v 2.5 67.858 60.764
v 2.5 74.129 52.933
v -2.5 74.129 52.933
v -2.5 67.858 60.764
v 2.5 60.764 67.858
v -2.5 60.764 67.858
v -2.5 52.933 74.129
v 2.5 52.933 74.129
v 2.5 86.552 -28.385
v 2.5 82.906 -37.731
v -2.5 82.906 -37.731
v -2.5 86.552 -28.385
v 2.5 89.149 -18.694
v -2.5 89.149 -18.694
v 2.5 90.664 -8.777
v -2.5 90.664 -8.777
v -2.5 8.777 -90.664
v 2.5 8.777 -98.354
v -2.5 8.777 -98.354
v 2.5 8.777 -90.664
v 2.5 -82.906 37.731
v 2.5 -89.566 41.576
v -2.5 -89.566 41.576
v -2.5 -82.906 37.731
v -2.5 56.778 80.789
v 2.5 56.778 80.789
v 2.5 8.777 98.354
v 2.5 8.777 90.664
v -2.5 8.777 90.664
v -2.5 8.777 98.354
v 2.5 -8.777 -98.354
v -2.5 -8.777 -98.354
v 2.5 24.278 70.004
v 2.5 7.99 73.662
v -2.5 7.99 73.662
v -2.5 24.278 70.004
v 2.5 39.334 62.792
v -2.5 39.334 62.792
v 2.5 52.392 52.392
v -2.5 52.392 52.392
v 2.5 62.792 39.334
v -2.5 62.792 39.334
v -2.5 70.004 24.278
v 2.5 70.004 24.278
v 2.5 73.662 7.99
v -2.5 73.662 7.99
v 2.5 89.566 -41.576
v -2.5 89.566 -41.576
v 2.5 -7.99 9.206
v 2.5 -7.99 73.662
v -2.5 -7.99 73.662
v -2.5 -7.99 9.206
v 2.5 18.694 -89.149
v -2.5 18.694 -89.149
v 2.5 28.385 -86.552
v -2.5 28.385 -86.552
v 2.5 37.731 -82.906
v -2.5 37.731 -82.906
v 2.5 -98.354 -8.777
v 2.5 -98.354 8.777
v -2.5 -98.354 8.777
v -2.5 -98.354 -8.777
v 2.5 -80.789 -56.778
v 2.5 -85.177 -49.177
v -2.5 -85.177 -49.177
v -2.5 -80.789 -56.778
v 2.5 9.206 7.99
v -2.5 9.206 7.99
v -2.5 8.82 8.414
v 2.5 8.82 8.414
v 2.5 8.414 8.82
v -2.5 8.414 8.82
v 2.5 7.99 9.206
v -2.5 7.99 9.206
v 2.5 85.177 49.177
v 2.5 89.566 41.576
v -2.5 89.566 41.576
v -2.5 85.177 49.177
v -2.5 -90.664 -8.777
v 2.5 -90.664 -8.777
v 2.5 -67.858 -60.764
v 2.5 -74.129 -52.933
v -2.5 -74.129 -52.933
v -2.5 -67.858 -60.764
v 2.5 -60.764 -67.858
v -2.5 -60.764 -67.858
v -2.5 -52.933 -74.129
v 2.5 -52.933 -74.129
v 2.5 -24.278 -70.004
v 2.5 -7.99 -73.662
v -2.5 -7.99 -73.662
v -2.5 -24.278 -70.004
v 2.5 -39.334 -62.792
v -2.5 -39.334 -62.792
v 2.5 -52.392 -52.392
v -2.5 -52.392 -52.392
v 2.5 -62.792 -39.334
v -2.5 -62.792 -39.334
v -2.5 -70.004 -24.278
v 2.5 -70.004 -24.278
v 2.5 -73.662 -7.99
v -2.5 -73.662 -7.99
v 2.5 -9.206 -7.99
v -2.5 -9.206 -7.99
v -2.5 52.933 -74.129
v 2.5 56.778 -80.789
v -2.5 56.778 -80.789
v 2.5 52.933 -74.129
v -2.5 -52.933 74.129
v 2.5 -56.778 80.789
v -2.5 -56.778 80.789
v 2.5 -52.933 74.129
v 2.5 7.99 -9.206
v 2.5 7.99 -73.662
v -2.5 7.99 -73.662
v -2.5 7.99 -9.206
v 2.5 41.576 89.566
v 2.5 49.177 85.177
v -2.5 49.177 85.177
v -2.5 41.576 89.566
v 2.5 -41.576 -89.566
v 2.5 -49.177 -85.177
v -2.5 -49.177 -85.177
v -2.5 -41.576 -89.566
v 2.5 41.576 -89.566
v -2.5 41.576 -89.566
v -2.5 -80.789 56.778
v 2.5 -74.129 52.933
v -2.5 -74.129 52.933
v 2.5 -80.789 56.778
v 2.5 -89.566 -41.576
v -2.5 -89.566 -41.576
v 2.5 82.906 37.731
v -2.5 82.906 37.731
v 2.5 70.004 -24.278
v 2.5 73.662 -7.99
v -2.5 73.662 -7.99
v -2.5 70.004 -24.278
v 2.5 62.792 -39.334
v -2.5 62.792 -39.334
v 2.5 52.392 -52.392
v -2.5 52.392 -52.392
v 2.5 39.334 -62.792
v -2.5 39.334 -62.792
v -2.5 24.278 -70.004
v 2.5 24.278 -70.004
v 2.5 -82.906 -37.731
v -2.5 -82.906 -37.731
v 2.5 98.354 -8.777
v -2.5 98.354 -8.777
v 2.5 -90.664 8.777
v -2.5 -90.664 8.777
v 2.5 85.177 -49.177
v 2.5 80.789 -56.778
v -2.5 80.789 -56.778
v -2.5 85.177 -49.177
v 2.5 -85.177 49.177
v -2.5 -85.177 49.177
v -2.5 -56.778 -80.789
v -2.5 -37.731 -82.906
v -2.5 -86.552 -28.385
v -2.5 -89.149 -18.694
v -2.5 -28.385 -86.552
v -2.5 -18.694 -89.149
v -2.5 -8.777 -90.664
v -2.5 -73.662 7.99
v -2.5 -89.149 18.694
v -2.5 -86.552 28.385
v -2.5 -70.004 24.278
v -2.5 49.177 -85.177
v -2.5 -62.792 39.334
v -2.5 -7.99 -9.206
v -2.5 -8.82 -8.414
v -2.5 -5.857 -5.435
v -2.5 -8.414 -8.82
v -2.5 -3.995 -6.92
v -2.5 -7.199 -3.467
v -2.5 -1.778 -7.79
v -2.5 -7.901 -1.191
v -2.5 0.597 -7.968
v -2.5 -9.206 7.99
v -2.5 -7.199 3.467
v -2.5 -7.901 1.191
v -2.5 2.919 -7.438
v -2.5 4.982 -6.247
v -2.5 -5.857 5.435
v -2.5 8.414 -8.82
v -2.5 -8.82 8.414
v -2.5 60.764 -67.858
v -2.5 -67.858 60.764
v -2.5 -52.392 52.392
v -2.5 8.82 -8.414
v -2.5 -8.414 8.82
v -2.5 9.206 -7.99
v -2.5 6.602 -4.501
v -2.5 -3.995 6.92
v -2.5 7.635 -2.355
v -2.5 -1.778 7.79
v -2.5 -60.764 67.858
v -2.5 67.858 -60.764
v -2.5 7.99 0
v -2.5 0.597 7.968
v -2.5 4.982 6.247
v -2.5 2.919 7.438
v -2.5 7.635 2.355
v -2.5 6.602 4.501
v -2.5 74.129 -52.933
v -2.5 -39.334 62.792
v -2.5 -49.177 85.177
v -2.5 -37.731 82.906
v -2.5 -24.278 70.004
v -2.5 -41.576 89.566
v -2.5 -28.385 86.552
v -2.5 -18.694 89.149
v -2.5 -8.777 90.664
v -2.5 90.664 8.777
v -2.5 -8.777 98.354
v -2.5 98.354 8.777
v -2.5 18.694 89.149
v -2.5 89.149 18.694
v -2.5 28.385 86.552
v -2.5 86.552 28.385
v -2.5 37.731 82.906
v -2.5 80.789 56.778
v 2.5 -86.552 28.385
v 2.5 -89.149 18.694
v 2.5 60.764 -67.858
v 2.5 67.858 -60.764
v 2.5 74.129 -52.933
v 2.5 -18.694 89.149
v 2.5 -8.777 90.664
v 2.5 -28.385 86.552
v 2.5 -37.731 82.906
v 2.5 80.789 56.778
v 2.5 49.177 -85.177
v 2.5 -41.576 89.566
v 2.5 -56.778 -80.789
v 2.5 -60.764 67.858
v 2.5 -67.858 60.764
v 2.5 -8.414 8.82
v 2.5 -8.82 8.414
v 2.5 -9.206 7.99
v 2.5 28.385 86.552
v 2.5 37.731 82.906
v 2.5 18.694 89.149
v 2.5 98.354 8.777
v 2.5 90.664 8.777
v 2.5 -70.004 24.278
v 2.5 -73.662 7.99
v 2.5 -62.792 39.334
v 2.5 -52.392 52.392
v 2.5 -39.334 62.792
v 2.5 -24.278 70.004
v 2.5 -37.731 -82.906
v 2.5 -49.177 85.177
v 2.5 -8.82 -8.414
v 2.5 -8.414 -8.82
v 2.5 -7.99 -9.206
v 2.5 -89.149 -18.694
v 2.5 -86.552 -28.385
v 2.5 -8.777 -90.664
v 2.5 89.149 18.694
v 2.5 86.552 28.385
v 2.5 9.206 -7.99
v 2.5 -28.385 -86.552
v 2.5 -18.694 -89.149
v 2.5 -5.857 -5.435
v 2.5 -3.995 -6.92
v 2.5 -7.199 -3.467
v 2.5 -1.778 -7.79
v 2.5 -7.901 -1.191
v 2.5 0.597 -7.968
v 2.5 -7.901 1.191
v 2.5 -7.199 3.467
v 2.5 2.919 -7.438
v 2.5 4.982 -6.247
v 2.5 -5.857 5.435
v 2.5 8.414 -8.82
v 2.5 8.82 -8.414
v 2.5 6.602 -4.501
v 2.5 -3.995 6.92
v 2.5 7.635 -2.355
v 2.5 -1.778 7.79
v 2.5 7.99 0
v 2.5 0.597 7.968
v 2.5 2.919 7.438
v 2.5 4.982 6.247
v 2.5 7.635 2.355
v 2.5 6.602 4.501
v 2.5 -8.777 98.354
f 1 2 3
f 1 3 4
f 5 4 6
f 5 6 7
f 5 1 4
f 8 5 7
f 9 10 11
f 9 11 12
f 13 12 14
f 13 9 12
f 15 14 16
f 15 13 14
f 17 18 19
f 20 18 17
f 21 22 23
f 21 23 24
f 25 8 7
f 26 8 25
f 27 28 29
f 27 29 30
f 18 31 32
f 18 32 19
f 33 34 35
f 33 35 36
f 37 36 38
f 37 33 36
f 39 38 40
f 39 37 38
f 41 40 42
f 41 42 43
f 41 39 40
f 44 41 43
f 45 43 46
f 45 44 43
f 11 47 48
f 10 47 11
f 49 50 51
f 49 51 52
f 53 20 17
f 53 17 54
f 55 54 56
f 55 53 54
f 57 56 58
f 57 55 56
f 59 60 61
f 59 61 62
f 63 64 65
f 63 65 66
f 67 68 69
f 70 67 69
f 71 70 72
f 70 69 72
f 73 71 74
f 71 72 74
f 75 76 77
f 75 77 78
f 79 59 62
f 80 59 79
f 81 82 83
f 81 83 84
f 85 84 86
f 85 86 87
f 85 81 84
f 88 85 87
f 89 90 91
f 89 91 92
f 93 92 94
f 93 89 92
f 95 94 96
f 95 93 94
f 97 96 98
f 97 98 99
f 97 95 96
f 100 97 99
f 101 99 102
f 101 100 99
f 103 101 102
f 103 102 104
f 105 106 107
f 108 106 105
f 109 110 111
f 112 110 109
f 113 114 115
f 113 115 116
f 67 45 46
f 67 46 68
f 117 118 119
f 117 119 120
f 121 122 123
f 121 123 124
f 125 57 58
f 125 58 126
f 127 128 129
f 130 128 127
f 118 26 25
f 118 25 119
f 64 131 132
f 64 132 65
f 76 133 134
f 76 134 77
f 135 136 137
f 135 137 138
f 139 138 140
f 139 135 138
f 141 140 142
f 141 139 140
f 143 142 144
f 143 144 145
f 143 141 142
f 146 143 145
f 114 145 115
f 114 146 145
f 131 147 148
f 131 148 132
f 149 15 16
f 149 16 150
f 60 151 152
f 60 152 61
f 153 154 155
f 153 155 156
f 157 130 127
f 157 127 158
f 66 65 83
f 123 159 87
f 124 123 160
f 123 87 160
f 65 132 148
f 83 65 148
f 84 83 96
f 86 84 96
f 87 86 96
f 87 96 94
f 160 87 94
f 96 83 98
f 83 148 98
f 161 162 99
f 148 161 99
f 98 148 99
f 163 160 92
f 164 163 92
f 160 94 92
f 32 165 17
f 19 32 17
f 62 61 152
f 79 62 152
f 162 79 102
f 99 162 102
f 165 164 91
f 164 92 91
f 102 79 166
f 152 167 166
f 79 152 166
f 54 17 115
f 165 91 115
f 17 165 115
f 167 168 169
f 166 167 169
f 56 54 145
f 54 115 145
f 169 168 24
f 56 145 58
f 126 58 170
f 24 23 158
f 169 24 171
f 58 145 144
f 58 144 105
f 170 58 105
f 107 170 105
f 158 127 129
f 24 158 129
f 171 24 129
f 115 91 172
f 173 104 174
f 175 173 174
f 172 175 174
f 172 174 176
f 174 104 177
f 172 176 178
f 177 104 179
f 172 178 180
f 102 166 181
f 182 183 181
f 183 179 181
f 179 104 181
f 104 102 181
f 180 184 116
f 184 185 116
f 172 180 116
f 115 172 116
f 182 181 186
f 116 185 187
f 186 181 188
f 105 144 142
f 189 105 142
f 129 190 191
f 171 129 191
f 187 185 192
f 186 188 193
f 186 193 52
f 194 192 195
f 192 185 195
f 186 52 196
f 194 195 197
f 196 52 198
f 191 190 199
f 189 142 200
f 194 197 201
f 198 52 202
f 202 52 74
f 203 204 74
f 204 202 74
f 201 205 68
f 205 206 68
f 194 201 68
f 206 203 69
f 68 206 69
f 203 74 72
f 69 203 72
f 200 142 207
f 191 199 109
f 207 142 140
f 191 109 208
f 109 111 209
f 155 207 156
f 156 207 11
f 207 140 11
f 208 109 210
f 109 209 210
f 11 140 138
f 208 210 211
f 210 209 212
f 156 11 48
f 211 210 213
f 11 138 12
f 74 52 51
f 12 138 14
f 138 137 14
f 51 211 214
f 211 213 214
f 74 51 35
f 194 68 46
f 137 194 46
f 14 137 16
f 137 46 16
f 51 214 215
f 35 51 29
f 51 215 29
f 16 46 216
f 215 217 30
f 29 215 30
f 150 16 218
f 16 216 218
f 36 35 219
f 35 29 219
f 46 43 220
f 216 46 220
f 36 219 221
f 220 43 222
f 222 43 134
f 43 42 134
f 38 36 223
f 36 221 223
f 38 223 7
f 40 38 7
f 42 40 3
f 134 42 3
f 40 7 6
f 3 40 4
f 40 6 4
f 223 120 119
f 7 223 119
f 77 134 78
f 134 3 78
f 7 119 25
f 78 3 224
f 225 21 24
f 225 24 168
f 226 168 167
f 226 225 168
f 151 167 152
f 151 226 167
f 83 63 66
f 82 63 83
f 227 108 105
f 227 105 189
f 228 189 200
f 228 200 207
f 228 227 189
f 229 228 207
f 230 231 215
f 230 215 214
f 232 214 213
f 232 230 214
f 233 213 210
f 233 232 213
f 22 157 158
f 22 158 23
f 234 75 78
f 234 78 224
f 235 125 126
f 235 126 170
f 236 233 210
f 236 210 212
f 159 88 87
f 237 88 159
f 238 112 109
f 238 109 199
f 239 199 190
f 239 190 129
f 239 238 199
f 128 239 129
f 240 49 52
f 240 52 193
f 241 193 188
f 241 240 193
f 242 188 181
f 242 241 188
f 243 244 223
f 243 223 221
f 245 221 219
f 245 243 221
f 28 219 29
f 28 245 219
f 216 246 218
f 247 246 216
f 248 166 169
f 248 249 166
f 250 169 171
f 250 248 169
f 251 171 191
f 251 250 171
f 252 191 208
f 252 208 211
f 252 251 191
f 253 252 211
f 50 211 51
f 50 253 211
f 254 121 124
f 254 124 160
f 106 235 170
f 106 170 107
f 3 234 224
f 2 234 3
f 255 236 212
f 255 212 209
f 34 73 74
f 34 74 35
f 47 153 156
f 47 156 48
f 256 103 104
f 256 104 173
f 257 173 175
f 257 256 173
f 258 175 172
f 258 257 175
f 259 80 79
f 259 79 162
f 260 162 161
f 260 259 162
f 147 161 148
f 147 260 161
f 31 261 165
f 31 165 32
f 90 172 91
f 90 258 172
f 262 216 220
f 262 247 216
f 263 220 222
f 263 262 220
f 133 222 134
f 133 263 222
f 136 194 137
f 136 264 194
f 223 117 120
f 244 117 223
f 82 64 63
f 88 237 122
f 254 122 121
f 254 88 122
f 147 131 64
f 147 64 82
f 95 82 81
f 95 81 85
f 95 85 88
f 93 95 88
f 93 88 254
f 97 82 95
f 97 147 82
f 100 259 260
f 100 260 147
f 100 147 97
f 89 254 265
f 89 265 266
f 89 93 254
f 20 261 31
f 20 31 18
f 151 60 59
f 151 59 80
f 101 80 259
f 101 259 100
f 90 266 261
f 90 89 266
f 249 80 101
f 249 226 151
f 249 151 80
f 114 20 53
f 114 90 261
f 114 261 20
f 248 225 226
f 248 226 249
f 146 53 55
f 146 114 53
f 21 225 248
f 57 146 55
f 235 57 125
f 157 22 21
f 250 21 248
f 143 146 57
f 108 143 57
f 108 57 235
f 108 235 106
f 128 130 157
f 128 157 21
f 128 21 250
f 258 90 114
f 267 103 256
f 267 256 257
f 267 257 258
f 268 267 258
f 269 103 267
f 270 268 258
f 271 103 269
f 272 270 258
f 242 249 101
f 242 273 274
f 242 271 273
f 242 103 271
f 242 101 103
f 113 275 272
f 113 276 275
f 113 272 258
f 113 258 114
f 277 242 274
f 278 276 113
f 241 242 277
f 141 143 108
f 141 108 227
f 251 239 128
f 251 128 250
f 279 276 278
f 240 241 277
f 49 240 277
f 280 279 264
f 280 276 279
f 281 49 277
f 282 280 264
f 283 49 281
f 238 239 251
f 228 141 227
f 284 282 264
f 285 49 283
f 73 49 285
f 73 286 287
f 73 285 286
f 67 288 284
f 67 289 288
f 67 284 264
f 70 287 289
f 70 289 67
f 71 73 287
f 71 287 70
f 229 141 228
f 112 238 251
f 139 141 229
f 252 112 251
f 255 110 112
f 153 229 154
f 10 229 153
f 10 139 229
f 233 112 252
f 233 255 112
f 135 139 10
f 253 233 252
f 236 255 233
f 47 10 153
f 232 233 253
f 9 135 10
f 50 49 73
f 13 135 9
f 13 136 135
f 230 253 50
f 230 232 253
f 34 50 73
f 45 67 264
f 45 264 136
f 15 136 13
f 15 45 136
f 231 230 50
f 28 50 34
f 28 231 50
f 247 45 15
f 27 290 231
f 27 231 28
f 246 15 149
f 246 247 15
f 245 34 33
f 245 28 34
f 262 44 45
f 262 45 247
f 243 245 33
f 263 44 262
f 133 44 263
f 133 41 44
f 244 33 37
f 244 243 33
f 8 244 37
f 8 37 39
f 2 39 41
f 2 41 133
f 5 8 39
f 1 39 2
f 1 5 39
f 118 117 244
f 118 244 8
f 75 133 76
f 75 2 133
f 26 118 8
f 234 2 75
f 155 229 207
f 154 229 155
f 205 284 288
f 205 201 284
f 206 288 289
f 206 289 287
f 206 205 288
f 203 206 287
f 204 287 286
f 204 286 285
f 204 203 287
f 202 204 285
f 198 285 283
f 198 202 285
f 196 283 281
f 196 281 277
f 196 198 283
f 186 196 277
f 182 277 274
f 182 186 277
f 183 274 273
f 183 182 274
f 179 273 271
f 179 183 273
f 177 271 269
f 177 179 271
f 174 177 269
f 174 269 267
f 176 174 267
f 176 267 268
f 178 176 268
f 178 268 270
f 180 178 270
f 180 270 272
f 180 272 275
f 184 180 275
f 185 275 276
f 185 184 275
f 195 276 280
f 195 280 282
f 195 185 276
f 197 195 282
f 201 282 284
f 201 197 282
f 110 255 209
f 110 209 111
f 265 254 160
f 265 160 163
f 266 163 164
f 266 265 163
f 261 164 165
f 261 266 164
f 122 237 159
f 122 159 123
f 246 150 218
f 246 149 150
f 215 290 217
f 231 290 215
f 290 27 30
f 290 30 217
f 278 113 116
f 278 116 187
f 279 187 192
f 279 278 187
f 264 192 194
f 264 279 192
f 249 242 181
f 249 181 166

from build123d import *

# Parameters (mm, degrees)
F0_R     = 7.9900958087
F1_DEPTH = 2.5


with BuildPart() as f1:
    # F0 (on Right) → F1 (new body, symmetric)
    with BuildSketch(Plane.YZ):
        with BuildLine():
            ThreePointArc((90.663921699, -8.776615878), (90.9817208721, -4.3934213602), (91.0877361894, 0))
            ThreePointArc((91.0877361894, 0), (90.9817208721, 4.3934213602), (90.663921699, 8.776615878))
            ThreePointArc((90.663921699, 8.776615878), (87.9839968435, 23.5752409011), (82.905567337, 37.7311885399))
            ThreePointArc((82.905567337, 37.7311885399), (78.8842935132, 45.5438680947), (74.128951459, 52.932733159))
            ThreePointArc((74.128951459, 52.932733159), (64.4087559424, 64.4087559424), (52.932733159, 74.128951459))
            ThreePointArc((52.932733159, 74.128951459), (45.5438680947, 78.8842935132), (37.7311885399, 82.905567337))
            ThreePointArc((37.7311885399, 82.905567337), (23.5752409011, 87.9839968435), (8.776615878, 90.663921699))
            ThreePointArc((8.776615878, 90.663921699), (0, 91.0877361894), (-8.776615878, 90.663921699))
            ThreePointArc((-8.776615878, 90.663921699), (-23.5752409011, 87.9839968435), (-37.7311885399, 82.905567337))
            ThreePointArc((-37.7311885399, 82.905567337), (-45.5438680947, 78.8842935132), (-52.932733159, 74.128951459))
            ThreePointArc((-52.932733159, 74.128951459), (-64.4087559424, 64.4087559424), (-74.128951459, 52.932733159))
            ThreePointArc((-74.128951459, 52.932733159), (-78.8842935132, 45.5438680947), (-82.905567337, 37.7311885399))
            ThreePointArc((-82.905567337, 37.7311885399), (-87.9839968435, 23.5752409011), (-90.663921699, 8.776615878))
            ThreePointArc((-90.663921699, 8.776615878), (-91.0877361894, 0), (-90.663921699, -8.776615878))
            ThreePointArc((-90.663921699, -8.776615878), (-87.9839968435, -23.5752409011), (-82.905567337, -37.7311885399))
            ThreePointArc((-82.905567337, -37.7311885399), (-78.8842935132, -45.5438680947), (-74.128951459, -52.932733159))
            ThreePointArc((-74.128951459, -52.932733159), (-64.4087559424, -64.4087559424), (-52.932733159, -74.128951459))
            ThreePointArc((-52.932733159, -74.128951459), (-45.5438680947, -78.8842935132), (-37.7311885399, -82.905567337))
            ThreePointArc((-37.7311885399, -82.905567337), (-23.5752409011, -87.9839968435), (-8.776615878, -90.663921699))
            ThreePointArc((-8.776615878, -90.663921699), (0, -91.0877361894), (8.776615878, -90.663921699))
            ThreePointArc((8.776615878, -90.663921699), (23.5752409011, -87.9839968435), (37.7311885399, -82.905567337))
            ThreePointArc((37.7311885399, -82.905567337), (45.5438680947, -78.8842935132), (52.932733159, -74.128951459))
            ThreePointArc((52.932733159, -74.128951459), (64.4087559424, -64.4087559424), (74.128951459, -52.932733159))
            ThreePointArc((74.128951459, -52.932733159), (78.8842935132, -45.5438680947), (82.905567337, -37.7311885399))
            ThreePointArc((82.905567337, -37.7311885399), (87.9839968435, -23.5752409011), (90.663921699, -8.776615878))
        make_face()
        with BuildLine():
            ThreePointArc((7.9900958087, 73.6620471974), (52.392455699, 52.392455699), (73.6620471974, 7.9900958087))
            ThreePointArc((73.6620471974, 7.9900958087), (73.9860240083, 4.0008848759), (74.0941214156, 0))
            ThreePointArc((74.0941214156, 0), (73.9860240083, -4.0008848759), (73.6620471974, -7.9900958087))
            ThreePointArc((73.6620471974, -7.9900958087), (52.392455699, -52.392455699), (7.9900958087, -73.6620471974))
            ThreePointArc((7.9900958087, -73.6620471974), (0, -74.0941214156), (-7.9900958087, -73.6620471974))
            ThreePointArc((-7.9900958087, -73.6620471974), (-52.392455699, -52.392455699), (-73.6620471974, -7.9900958087))
            ThreePointArc((-73.6620471974, -7.9900958087), (-74.0941214156, 0), (-73.6620471974, 7.9900958087))
            ThreePointArc((-73.6620471974, 7.9900958087), (-52.392455699, 52.392455699), (-7.9900958087, 73.6620471974))
            ThreePointArc((-7.9900958087, 73.6620471974), (0, 74.0941214156), (7.9900958087, 73.6620471974))
        make_face(mode=Mode.SUBTRACT)
        with BuildLine():
            ThreePointArc((-7.9900958087, 9.2055597007), (0, 12.1895020586), (7.9900958087, 9.2055597007))
            Line((7.9900958087, 9.2055597007), (7.9900958087, 73.6620471974))
            ThreePointArc((7.9900958087, 73.6620471974), (0, 74.0941214156), (-7.9900958087, 73.6620471974))
            Line((-7.9900958087, 73.6620471974), (-7.9900958087, 9.2055597007))
        make_face()
        with BuildLine():
            ThreePointArc((-9.2055597007, -7.9900958087), (-12.1895020586, 0), (-9.2055597007, 7.9900958087))
            Line((-9.2055597007, 7.9900958087), (-73.6620471974, 7.9900958087))
            ThreePointArc((-73.6620471974, 7.9900958087), (-74.0941214156, 0), (-73.6620471974, -7.9900958087))
            Line((-73.6620471974, -7.9900958087), (-9.2055597007, -7.9900958087))
        make_face()
        with BuildLine():
            ThreePointArc((9.2055597007, 7.9900958087), (11.4191757443, 4.2645498891), (12.1895020586, 0))
            ThreePointArc((12.1895020586, 0), (11.4191757443, -4.2645498891), (9.2055597007, -7.9900958087))
            Line((9.2055597007, -7.9900958087), (73.6620471974, -7.9900958087))
            ThreePointArc((73.6620471974, -7.9900958087), (73.9860240083, -4.0008848759), (74.0941214156, 0))
            ThreePointArc((74.0941214156, 0), (73.9860240083, 4.0008848759), (73.6620471974, 7.9900958087))
            Line((73.6620471974, 7.9900958087), (9.2055597007, 7.9900958087))
        make_face()
        with BuildLine():
            Line((7.9900958087, -73.6620471974), (7.9900958087, -9.2055597007))
            ThreePointArc((7.9900958087, -9.2055597007), (0, -12.1895020586), (-7.9900958087, -9.2055597007))
            Line((-7.9900958087, -9.2055597007), (-7.9900958087, -73.6620471974))
            ThreePointArc((-7.9900958087, -73.6620471974), (0, -74.0941214156), (7.9900958087, -73.6620471974))
        make_face()
        with BuildLine():
            ThreePointArc((9.2055597007, -7.9900958087), (11.4191757443, -4.2645498891), (12.1895020586, 0))
            ThreePointArc((12.1895020586, 0), (11.4191757443, 4.2645498891), (9.2055597007, 7.9900958087))
            ThreePointArc((9.2055597007, 7.9900958087), (8.6192795649, 8.6192795649), (7.9900958087, 9.2055597007))
            ThreePointArc((7.9900958087, 9.2055597007), (0, 12.1895020586), (-7.9900958087, 9.2055597007))
            ThreePointArc((-7.9900958087, 9.2055597007), (-8.6192795649, 8.6192795649), (-9.2055597007, 7.9900958087))
            ThreePointArc((-9.2055597007, 7.9900958087), (-12.1895020586, 0), (-9.2055597007, -7.9900958087))
            ThreePointArc((-9.2055597007, -7.9900958087), (-8.6192795649, -8.6192795649), (-7.9900958087, -9.2055597007))
            ThreePointArc((-7.9900958087, -9.2055597007), (0, -12.1895020586), (7.9900958087, -9.2055597007))
            ThreePointArc((7.9900958087, -9.2055597007), (8.6192795649, -8.6192795649), (9.2055597007, -7.9900958087))
        make_face()
        Circle(F0_R, mode=Mode.SUBTRACT)
        with BuildLine():
            ThreePointArc((-8.776615878, 90.663921699), (0, 91.0877361894), (8.776615878, 90.663921699))
            Line((8.776615878, 90.663921699), (8.776615878, 98.354325348))
            Line((8.776615878, 98.354325348), (0, 98.354325348))
            Line((0, 98.354325348), (-8.776615878, 98.354325348))
            Line((-8.776615878, 98.354325348), (-8.776615878, 90.663921699))
        make_face()
        with BuildLine():
            ThreePointArc((37.7311885399, 82.905567337), (45.5438680947, 78.8842935132), (52.932733159, 74.128951459))
            Line((52.932733159, 74.128951459), (56.7779349836, 80.7890363845))
            Line((56.7779349836, 80.7890363845), (49.177162674, 85.1773443235))
            Line((49.177162674, 85.1773443235), (41.5763903644, 89.5656522624))
            Line((41.5763903644, 89.5656522624), (37.7311885399, 82.905567337))
        make_face()
        with BuildLine():
            ThreePointArc((74.128951459, 52.932733159), (78.8842935132, 45.5438680947), (82.905567337, 37.7311885399))
            Line((82.905567337, 37.7311885399), (89.5656522624, 41.5763903644))
            Line((89.5656522624, 41.5763903644), (85.1773443235, 49.177162674))
            Line((85.1773443235, 49.177162674), (80.7890363845, 56.7779349836))
            Line((80.7890363845, 56.7779349836), (74.128951459, 52.932733159))
        make_face()
        with BuildLine():
            ThreePointArc((90.663921699, 8.776615878), (90.9817208721, 4.3934213602), (91.0877361894, 0))
            ThreePointArc((91.0877361894, 0), (90.9817208721, -4.3934213602), (90.663921699, -8.776615878))
            Line((90.663921699, -8.776615878), (98.354325348, -8.776615878))
            Line((98.354325348, -8.776615878), (98.354325348, 0))
            Line((98.354325348, 0), (98.354325348, 8.776615878))
            Line((98.354325348, 8.776615878), (90.663921699, 8.776615878))
        make_face()
        with BuildLine():
            Line((89.5656522624, -41.5763903644), (82.905567337, -37.7311885399))
            ThreePointArc((82.905567337, -37.7311885399), (78.8842935132, -45.5438680947), (74.128951459, -52.932733159))
            Line((74.128951459, -52.932733159), (80.7890363845, -56.7779349836))
            Line((80.7890363845, -56.7779349836), (85.1773443235, -49.177162674))
            Line((85.1773443235, -49.177162674), (89.5656522624, -41.5763903644))
        make_face()
        with BuildLine():
            Line((56.7779349836, -80.7890363845), (52.932733159, -74.128951459))
            ThreePointArc((52.932733159, -74.128951459), (45.5438680947, -78.8842935132), (37.7311885399, -82.905567337))
            Line((37.7311885399, -82.905567337), (41.5763903644, -89.5656522624))
            Line((41.5763903644, -89.5656522624), (49.177162674, -85.1773443235))
            Line((49.177162674, -85.1773443235), (56.7779349836, -80.7890363845))
        make_face()
        with BuildLine():
            Line((8.776615878, -98.354325348), (8.776615878, -90.663921699))
            ThreePointArc((8.776615878, -90.663921699), (0, -91.0877361894), (-8.776615878, -90.663921699))
            Line((-8.776615878, -90.663921699), (-8.776615878, -98.354325348))
            Line((-8.776615878, -98.354325348), (0, -98.354325348))
            Line((0, -98.354325348), (8.776615878, -98.354325348))
        make_face()
        with BuildLine():
            Line((-41.5763903644, -89.5656522624), (-37.7311885399, -82.905567337))
            ThreePointArc((-37.7311885399, -82.905567337), (-45.5438680947, -78.8842935132), (-52.932733159, -74.128951459))
            Line((-52.932733159, -74.128951459), (-56.7779349836, -80.7890363845))
            Line((-56.7779349836, -80.7890363845), (-49.177162674, -85.1773443235))
            Line((-49.177162674, -85.1773443235), (-41.5763903644, -89.5656522624))
        make_face()
        with BuildLine():
            Line((-80.7890363845, -56.7779349836), (-74.128951459, -52.932733159))
            ThreePointArc((-74.128951459, -52.932733159), (-78.8842935132, -45.5438680947), (-82.905567337, -37.7311885399))
            Line((-82.905567337, -37.7311885399), (-89.5656522624, -41.5763903644))
            Line((-89.5656522624, -41.5763903644), (-85.1773443235, -49.177162674))
            Line((-85.1773443235, -49.177162674), (-80.7890363845, -56.7779349836))
        make_face()
        with BuildLine():
            ThreePointArc((-90.663921699, -8.776615878), (-91.0877361894, 0), (-90.663921699, 8.776615878))
            Line((-90.663921699, 8.776615878), (-98.354325348, 8.776615878))
            Line((-98.354325348, 8.776615878), (-98.354325348, 0))
            Line((-98.354325348, 0), (-98.354325348, -8.776615878))
            Line((-98.354325348, -8.776615878), (-90.663921699, -8.776615878))
        make_face()
        with BuildLine():
            ThreePointArc((-82.905567337, 37.7311885399), (-78.8842935132, 45.5438680947), (-74.128951459, 52.932733159))
            Line((-74.128951459, 52.932733159), (-80.7890363845, 56.7779349836))
            Line((-80.7890363845, 56.7779349836), (-85.1773443235, 49.177162674))
            Line((-85.1773443235, 49.177162674), (-89.5656522624, 41.5763903644))
            Line((-89.5656522624, 41.5763903644), (-82.905567337, 37.7311885399))
        make_face()
        with BuildLine():
            ThreePointArc((-52.932733159, 74.128951459), (-45.5438680947, 78.8842935132), (-37.7311885399, 82.905567337))
            Line((-37.7311885399, 82.905567337), (-41.5763903644, 89.5656522624))
            Line((-41.5763903644, 89.5656522624), (-49.177162674, 85.1773443235))
            Line((-49.177162674, 85.1773443235), (-56.7779349836, 80.7890363845))
            Line((-56.7779349836, 80.7890363845), (-52.932733159, 74.128951459))
        make_face()
    extrude(amount=F1_DEPTH, both=True)


solid = f1.part
